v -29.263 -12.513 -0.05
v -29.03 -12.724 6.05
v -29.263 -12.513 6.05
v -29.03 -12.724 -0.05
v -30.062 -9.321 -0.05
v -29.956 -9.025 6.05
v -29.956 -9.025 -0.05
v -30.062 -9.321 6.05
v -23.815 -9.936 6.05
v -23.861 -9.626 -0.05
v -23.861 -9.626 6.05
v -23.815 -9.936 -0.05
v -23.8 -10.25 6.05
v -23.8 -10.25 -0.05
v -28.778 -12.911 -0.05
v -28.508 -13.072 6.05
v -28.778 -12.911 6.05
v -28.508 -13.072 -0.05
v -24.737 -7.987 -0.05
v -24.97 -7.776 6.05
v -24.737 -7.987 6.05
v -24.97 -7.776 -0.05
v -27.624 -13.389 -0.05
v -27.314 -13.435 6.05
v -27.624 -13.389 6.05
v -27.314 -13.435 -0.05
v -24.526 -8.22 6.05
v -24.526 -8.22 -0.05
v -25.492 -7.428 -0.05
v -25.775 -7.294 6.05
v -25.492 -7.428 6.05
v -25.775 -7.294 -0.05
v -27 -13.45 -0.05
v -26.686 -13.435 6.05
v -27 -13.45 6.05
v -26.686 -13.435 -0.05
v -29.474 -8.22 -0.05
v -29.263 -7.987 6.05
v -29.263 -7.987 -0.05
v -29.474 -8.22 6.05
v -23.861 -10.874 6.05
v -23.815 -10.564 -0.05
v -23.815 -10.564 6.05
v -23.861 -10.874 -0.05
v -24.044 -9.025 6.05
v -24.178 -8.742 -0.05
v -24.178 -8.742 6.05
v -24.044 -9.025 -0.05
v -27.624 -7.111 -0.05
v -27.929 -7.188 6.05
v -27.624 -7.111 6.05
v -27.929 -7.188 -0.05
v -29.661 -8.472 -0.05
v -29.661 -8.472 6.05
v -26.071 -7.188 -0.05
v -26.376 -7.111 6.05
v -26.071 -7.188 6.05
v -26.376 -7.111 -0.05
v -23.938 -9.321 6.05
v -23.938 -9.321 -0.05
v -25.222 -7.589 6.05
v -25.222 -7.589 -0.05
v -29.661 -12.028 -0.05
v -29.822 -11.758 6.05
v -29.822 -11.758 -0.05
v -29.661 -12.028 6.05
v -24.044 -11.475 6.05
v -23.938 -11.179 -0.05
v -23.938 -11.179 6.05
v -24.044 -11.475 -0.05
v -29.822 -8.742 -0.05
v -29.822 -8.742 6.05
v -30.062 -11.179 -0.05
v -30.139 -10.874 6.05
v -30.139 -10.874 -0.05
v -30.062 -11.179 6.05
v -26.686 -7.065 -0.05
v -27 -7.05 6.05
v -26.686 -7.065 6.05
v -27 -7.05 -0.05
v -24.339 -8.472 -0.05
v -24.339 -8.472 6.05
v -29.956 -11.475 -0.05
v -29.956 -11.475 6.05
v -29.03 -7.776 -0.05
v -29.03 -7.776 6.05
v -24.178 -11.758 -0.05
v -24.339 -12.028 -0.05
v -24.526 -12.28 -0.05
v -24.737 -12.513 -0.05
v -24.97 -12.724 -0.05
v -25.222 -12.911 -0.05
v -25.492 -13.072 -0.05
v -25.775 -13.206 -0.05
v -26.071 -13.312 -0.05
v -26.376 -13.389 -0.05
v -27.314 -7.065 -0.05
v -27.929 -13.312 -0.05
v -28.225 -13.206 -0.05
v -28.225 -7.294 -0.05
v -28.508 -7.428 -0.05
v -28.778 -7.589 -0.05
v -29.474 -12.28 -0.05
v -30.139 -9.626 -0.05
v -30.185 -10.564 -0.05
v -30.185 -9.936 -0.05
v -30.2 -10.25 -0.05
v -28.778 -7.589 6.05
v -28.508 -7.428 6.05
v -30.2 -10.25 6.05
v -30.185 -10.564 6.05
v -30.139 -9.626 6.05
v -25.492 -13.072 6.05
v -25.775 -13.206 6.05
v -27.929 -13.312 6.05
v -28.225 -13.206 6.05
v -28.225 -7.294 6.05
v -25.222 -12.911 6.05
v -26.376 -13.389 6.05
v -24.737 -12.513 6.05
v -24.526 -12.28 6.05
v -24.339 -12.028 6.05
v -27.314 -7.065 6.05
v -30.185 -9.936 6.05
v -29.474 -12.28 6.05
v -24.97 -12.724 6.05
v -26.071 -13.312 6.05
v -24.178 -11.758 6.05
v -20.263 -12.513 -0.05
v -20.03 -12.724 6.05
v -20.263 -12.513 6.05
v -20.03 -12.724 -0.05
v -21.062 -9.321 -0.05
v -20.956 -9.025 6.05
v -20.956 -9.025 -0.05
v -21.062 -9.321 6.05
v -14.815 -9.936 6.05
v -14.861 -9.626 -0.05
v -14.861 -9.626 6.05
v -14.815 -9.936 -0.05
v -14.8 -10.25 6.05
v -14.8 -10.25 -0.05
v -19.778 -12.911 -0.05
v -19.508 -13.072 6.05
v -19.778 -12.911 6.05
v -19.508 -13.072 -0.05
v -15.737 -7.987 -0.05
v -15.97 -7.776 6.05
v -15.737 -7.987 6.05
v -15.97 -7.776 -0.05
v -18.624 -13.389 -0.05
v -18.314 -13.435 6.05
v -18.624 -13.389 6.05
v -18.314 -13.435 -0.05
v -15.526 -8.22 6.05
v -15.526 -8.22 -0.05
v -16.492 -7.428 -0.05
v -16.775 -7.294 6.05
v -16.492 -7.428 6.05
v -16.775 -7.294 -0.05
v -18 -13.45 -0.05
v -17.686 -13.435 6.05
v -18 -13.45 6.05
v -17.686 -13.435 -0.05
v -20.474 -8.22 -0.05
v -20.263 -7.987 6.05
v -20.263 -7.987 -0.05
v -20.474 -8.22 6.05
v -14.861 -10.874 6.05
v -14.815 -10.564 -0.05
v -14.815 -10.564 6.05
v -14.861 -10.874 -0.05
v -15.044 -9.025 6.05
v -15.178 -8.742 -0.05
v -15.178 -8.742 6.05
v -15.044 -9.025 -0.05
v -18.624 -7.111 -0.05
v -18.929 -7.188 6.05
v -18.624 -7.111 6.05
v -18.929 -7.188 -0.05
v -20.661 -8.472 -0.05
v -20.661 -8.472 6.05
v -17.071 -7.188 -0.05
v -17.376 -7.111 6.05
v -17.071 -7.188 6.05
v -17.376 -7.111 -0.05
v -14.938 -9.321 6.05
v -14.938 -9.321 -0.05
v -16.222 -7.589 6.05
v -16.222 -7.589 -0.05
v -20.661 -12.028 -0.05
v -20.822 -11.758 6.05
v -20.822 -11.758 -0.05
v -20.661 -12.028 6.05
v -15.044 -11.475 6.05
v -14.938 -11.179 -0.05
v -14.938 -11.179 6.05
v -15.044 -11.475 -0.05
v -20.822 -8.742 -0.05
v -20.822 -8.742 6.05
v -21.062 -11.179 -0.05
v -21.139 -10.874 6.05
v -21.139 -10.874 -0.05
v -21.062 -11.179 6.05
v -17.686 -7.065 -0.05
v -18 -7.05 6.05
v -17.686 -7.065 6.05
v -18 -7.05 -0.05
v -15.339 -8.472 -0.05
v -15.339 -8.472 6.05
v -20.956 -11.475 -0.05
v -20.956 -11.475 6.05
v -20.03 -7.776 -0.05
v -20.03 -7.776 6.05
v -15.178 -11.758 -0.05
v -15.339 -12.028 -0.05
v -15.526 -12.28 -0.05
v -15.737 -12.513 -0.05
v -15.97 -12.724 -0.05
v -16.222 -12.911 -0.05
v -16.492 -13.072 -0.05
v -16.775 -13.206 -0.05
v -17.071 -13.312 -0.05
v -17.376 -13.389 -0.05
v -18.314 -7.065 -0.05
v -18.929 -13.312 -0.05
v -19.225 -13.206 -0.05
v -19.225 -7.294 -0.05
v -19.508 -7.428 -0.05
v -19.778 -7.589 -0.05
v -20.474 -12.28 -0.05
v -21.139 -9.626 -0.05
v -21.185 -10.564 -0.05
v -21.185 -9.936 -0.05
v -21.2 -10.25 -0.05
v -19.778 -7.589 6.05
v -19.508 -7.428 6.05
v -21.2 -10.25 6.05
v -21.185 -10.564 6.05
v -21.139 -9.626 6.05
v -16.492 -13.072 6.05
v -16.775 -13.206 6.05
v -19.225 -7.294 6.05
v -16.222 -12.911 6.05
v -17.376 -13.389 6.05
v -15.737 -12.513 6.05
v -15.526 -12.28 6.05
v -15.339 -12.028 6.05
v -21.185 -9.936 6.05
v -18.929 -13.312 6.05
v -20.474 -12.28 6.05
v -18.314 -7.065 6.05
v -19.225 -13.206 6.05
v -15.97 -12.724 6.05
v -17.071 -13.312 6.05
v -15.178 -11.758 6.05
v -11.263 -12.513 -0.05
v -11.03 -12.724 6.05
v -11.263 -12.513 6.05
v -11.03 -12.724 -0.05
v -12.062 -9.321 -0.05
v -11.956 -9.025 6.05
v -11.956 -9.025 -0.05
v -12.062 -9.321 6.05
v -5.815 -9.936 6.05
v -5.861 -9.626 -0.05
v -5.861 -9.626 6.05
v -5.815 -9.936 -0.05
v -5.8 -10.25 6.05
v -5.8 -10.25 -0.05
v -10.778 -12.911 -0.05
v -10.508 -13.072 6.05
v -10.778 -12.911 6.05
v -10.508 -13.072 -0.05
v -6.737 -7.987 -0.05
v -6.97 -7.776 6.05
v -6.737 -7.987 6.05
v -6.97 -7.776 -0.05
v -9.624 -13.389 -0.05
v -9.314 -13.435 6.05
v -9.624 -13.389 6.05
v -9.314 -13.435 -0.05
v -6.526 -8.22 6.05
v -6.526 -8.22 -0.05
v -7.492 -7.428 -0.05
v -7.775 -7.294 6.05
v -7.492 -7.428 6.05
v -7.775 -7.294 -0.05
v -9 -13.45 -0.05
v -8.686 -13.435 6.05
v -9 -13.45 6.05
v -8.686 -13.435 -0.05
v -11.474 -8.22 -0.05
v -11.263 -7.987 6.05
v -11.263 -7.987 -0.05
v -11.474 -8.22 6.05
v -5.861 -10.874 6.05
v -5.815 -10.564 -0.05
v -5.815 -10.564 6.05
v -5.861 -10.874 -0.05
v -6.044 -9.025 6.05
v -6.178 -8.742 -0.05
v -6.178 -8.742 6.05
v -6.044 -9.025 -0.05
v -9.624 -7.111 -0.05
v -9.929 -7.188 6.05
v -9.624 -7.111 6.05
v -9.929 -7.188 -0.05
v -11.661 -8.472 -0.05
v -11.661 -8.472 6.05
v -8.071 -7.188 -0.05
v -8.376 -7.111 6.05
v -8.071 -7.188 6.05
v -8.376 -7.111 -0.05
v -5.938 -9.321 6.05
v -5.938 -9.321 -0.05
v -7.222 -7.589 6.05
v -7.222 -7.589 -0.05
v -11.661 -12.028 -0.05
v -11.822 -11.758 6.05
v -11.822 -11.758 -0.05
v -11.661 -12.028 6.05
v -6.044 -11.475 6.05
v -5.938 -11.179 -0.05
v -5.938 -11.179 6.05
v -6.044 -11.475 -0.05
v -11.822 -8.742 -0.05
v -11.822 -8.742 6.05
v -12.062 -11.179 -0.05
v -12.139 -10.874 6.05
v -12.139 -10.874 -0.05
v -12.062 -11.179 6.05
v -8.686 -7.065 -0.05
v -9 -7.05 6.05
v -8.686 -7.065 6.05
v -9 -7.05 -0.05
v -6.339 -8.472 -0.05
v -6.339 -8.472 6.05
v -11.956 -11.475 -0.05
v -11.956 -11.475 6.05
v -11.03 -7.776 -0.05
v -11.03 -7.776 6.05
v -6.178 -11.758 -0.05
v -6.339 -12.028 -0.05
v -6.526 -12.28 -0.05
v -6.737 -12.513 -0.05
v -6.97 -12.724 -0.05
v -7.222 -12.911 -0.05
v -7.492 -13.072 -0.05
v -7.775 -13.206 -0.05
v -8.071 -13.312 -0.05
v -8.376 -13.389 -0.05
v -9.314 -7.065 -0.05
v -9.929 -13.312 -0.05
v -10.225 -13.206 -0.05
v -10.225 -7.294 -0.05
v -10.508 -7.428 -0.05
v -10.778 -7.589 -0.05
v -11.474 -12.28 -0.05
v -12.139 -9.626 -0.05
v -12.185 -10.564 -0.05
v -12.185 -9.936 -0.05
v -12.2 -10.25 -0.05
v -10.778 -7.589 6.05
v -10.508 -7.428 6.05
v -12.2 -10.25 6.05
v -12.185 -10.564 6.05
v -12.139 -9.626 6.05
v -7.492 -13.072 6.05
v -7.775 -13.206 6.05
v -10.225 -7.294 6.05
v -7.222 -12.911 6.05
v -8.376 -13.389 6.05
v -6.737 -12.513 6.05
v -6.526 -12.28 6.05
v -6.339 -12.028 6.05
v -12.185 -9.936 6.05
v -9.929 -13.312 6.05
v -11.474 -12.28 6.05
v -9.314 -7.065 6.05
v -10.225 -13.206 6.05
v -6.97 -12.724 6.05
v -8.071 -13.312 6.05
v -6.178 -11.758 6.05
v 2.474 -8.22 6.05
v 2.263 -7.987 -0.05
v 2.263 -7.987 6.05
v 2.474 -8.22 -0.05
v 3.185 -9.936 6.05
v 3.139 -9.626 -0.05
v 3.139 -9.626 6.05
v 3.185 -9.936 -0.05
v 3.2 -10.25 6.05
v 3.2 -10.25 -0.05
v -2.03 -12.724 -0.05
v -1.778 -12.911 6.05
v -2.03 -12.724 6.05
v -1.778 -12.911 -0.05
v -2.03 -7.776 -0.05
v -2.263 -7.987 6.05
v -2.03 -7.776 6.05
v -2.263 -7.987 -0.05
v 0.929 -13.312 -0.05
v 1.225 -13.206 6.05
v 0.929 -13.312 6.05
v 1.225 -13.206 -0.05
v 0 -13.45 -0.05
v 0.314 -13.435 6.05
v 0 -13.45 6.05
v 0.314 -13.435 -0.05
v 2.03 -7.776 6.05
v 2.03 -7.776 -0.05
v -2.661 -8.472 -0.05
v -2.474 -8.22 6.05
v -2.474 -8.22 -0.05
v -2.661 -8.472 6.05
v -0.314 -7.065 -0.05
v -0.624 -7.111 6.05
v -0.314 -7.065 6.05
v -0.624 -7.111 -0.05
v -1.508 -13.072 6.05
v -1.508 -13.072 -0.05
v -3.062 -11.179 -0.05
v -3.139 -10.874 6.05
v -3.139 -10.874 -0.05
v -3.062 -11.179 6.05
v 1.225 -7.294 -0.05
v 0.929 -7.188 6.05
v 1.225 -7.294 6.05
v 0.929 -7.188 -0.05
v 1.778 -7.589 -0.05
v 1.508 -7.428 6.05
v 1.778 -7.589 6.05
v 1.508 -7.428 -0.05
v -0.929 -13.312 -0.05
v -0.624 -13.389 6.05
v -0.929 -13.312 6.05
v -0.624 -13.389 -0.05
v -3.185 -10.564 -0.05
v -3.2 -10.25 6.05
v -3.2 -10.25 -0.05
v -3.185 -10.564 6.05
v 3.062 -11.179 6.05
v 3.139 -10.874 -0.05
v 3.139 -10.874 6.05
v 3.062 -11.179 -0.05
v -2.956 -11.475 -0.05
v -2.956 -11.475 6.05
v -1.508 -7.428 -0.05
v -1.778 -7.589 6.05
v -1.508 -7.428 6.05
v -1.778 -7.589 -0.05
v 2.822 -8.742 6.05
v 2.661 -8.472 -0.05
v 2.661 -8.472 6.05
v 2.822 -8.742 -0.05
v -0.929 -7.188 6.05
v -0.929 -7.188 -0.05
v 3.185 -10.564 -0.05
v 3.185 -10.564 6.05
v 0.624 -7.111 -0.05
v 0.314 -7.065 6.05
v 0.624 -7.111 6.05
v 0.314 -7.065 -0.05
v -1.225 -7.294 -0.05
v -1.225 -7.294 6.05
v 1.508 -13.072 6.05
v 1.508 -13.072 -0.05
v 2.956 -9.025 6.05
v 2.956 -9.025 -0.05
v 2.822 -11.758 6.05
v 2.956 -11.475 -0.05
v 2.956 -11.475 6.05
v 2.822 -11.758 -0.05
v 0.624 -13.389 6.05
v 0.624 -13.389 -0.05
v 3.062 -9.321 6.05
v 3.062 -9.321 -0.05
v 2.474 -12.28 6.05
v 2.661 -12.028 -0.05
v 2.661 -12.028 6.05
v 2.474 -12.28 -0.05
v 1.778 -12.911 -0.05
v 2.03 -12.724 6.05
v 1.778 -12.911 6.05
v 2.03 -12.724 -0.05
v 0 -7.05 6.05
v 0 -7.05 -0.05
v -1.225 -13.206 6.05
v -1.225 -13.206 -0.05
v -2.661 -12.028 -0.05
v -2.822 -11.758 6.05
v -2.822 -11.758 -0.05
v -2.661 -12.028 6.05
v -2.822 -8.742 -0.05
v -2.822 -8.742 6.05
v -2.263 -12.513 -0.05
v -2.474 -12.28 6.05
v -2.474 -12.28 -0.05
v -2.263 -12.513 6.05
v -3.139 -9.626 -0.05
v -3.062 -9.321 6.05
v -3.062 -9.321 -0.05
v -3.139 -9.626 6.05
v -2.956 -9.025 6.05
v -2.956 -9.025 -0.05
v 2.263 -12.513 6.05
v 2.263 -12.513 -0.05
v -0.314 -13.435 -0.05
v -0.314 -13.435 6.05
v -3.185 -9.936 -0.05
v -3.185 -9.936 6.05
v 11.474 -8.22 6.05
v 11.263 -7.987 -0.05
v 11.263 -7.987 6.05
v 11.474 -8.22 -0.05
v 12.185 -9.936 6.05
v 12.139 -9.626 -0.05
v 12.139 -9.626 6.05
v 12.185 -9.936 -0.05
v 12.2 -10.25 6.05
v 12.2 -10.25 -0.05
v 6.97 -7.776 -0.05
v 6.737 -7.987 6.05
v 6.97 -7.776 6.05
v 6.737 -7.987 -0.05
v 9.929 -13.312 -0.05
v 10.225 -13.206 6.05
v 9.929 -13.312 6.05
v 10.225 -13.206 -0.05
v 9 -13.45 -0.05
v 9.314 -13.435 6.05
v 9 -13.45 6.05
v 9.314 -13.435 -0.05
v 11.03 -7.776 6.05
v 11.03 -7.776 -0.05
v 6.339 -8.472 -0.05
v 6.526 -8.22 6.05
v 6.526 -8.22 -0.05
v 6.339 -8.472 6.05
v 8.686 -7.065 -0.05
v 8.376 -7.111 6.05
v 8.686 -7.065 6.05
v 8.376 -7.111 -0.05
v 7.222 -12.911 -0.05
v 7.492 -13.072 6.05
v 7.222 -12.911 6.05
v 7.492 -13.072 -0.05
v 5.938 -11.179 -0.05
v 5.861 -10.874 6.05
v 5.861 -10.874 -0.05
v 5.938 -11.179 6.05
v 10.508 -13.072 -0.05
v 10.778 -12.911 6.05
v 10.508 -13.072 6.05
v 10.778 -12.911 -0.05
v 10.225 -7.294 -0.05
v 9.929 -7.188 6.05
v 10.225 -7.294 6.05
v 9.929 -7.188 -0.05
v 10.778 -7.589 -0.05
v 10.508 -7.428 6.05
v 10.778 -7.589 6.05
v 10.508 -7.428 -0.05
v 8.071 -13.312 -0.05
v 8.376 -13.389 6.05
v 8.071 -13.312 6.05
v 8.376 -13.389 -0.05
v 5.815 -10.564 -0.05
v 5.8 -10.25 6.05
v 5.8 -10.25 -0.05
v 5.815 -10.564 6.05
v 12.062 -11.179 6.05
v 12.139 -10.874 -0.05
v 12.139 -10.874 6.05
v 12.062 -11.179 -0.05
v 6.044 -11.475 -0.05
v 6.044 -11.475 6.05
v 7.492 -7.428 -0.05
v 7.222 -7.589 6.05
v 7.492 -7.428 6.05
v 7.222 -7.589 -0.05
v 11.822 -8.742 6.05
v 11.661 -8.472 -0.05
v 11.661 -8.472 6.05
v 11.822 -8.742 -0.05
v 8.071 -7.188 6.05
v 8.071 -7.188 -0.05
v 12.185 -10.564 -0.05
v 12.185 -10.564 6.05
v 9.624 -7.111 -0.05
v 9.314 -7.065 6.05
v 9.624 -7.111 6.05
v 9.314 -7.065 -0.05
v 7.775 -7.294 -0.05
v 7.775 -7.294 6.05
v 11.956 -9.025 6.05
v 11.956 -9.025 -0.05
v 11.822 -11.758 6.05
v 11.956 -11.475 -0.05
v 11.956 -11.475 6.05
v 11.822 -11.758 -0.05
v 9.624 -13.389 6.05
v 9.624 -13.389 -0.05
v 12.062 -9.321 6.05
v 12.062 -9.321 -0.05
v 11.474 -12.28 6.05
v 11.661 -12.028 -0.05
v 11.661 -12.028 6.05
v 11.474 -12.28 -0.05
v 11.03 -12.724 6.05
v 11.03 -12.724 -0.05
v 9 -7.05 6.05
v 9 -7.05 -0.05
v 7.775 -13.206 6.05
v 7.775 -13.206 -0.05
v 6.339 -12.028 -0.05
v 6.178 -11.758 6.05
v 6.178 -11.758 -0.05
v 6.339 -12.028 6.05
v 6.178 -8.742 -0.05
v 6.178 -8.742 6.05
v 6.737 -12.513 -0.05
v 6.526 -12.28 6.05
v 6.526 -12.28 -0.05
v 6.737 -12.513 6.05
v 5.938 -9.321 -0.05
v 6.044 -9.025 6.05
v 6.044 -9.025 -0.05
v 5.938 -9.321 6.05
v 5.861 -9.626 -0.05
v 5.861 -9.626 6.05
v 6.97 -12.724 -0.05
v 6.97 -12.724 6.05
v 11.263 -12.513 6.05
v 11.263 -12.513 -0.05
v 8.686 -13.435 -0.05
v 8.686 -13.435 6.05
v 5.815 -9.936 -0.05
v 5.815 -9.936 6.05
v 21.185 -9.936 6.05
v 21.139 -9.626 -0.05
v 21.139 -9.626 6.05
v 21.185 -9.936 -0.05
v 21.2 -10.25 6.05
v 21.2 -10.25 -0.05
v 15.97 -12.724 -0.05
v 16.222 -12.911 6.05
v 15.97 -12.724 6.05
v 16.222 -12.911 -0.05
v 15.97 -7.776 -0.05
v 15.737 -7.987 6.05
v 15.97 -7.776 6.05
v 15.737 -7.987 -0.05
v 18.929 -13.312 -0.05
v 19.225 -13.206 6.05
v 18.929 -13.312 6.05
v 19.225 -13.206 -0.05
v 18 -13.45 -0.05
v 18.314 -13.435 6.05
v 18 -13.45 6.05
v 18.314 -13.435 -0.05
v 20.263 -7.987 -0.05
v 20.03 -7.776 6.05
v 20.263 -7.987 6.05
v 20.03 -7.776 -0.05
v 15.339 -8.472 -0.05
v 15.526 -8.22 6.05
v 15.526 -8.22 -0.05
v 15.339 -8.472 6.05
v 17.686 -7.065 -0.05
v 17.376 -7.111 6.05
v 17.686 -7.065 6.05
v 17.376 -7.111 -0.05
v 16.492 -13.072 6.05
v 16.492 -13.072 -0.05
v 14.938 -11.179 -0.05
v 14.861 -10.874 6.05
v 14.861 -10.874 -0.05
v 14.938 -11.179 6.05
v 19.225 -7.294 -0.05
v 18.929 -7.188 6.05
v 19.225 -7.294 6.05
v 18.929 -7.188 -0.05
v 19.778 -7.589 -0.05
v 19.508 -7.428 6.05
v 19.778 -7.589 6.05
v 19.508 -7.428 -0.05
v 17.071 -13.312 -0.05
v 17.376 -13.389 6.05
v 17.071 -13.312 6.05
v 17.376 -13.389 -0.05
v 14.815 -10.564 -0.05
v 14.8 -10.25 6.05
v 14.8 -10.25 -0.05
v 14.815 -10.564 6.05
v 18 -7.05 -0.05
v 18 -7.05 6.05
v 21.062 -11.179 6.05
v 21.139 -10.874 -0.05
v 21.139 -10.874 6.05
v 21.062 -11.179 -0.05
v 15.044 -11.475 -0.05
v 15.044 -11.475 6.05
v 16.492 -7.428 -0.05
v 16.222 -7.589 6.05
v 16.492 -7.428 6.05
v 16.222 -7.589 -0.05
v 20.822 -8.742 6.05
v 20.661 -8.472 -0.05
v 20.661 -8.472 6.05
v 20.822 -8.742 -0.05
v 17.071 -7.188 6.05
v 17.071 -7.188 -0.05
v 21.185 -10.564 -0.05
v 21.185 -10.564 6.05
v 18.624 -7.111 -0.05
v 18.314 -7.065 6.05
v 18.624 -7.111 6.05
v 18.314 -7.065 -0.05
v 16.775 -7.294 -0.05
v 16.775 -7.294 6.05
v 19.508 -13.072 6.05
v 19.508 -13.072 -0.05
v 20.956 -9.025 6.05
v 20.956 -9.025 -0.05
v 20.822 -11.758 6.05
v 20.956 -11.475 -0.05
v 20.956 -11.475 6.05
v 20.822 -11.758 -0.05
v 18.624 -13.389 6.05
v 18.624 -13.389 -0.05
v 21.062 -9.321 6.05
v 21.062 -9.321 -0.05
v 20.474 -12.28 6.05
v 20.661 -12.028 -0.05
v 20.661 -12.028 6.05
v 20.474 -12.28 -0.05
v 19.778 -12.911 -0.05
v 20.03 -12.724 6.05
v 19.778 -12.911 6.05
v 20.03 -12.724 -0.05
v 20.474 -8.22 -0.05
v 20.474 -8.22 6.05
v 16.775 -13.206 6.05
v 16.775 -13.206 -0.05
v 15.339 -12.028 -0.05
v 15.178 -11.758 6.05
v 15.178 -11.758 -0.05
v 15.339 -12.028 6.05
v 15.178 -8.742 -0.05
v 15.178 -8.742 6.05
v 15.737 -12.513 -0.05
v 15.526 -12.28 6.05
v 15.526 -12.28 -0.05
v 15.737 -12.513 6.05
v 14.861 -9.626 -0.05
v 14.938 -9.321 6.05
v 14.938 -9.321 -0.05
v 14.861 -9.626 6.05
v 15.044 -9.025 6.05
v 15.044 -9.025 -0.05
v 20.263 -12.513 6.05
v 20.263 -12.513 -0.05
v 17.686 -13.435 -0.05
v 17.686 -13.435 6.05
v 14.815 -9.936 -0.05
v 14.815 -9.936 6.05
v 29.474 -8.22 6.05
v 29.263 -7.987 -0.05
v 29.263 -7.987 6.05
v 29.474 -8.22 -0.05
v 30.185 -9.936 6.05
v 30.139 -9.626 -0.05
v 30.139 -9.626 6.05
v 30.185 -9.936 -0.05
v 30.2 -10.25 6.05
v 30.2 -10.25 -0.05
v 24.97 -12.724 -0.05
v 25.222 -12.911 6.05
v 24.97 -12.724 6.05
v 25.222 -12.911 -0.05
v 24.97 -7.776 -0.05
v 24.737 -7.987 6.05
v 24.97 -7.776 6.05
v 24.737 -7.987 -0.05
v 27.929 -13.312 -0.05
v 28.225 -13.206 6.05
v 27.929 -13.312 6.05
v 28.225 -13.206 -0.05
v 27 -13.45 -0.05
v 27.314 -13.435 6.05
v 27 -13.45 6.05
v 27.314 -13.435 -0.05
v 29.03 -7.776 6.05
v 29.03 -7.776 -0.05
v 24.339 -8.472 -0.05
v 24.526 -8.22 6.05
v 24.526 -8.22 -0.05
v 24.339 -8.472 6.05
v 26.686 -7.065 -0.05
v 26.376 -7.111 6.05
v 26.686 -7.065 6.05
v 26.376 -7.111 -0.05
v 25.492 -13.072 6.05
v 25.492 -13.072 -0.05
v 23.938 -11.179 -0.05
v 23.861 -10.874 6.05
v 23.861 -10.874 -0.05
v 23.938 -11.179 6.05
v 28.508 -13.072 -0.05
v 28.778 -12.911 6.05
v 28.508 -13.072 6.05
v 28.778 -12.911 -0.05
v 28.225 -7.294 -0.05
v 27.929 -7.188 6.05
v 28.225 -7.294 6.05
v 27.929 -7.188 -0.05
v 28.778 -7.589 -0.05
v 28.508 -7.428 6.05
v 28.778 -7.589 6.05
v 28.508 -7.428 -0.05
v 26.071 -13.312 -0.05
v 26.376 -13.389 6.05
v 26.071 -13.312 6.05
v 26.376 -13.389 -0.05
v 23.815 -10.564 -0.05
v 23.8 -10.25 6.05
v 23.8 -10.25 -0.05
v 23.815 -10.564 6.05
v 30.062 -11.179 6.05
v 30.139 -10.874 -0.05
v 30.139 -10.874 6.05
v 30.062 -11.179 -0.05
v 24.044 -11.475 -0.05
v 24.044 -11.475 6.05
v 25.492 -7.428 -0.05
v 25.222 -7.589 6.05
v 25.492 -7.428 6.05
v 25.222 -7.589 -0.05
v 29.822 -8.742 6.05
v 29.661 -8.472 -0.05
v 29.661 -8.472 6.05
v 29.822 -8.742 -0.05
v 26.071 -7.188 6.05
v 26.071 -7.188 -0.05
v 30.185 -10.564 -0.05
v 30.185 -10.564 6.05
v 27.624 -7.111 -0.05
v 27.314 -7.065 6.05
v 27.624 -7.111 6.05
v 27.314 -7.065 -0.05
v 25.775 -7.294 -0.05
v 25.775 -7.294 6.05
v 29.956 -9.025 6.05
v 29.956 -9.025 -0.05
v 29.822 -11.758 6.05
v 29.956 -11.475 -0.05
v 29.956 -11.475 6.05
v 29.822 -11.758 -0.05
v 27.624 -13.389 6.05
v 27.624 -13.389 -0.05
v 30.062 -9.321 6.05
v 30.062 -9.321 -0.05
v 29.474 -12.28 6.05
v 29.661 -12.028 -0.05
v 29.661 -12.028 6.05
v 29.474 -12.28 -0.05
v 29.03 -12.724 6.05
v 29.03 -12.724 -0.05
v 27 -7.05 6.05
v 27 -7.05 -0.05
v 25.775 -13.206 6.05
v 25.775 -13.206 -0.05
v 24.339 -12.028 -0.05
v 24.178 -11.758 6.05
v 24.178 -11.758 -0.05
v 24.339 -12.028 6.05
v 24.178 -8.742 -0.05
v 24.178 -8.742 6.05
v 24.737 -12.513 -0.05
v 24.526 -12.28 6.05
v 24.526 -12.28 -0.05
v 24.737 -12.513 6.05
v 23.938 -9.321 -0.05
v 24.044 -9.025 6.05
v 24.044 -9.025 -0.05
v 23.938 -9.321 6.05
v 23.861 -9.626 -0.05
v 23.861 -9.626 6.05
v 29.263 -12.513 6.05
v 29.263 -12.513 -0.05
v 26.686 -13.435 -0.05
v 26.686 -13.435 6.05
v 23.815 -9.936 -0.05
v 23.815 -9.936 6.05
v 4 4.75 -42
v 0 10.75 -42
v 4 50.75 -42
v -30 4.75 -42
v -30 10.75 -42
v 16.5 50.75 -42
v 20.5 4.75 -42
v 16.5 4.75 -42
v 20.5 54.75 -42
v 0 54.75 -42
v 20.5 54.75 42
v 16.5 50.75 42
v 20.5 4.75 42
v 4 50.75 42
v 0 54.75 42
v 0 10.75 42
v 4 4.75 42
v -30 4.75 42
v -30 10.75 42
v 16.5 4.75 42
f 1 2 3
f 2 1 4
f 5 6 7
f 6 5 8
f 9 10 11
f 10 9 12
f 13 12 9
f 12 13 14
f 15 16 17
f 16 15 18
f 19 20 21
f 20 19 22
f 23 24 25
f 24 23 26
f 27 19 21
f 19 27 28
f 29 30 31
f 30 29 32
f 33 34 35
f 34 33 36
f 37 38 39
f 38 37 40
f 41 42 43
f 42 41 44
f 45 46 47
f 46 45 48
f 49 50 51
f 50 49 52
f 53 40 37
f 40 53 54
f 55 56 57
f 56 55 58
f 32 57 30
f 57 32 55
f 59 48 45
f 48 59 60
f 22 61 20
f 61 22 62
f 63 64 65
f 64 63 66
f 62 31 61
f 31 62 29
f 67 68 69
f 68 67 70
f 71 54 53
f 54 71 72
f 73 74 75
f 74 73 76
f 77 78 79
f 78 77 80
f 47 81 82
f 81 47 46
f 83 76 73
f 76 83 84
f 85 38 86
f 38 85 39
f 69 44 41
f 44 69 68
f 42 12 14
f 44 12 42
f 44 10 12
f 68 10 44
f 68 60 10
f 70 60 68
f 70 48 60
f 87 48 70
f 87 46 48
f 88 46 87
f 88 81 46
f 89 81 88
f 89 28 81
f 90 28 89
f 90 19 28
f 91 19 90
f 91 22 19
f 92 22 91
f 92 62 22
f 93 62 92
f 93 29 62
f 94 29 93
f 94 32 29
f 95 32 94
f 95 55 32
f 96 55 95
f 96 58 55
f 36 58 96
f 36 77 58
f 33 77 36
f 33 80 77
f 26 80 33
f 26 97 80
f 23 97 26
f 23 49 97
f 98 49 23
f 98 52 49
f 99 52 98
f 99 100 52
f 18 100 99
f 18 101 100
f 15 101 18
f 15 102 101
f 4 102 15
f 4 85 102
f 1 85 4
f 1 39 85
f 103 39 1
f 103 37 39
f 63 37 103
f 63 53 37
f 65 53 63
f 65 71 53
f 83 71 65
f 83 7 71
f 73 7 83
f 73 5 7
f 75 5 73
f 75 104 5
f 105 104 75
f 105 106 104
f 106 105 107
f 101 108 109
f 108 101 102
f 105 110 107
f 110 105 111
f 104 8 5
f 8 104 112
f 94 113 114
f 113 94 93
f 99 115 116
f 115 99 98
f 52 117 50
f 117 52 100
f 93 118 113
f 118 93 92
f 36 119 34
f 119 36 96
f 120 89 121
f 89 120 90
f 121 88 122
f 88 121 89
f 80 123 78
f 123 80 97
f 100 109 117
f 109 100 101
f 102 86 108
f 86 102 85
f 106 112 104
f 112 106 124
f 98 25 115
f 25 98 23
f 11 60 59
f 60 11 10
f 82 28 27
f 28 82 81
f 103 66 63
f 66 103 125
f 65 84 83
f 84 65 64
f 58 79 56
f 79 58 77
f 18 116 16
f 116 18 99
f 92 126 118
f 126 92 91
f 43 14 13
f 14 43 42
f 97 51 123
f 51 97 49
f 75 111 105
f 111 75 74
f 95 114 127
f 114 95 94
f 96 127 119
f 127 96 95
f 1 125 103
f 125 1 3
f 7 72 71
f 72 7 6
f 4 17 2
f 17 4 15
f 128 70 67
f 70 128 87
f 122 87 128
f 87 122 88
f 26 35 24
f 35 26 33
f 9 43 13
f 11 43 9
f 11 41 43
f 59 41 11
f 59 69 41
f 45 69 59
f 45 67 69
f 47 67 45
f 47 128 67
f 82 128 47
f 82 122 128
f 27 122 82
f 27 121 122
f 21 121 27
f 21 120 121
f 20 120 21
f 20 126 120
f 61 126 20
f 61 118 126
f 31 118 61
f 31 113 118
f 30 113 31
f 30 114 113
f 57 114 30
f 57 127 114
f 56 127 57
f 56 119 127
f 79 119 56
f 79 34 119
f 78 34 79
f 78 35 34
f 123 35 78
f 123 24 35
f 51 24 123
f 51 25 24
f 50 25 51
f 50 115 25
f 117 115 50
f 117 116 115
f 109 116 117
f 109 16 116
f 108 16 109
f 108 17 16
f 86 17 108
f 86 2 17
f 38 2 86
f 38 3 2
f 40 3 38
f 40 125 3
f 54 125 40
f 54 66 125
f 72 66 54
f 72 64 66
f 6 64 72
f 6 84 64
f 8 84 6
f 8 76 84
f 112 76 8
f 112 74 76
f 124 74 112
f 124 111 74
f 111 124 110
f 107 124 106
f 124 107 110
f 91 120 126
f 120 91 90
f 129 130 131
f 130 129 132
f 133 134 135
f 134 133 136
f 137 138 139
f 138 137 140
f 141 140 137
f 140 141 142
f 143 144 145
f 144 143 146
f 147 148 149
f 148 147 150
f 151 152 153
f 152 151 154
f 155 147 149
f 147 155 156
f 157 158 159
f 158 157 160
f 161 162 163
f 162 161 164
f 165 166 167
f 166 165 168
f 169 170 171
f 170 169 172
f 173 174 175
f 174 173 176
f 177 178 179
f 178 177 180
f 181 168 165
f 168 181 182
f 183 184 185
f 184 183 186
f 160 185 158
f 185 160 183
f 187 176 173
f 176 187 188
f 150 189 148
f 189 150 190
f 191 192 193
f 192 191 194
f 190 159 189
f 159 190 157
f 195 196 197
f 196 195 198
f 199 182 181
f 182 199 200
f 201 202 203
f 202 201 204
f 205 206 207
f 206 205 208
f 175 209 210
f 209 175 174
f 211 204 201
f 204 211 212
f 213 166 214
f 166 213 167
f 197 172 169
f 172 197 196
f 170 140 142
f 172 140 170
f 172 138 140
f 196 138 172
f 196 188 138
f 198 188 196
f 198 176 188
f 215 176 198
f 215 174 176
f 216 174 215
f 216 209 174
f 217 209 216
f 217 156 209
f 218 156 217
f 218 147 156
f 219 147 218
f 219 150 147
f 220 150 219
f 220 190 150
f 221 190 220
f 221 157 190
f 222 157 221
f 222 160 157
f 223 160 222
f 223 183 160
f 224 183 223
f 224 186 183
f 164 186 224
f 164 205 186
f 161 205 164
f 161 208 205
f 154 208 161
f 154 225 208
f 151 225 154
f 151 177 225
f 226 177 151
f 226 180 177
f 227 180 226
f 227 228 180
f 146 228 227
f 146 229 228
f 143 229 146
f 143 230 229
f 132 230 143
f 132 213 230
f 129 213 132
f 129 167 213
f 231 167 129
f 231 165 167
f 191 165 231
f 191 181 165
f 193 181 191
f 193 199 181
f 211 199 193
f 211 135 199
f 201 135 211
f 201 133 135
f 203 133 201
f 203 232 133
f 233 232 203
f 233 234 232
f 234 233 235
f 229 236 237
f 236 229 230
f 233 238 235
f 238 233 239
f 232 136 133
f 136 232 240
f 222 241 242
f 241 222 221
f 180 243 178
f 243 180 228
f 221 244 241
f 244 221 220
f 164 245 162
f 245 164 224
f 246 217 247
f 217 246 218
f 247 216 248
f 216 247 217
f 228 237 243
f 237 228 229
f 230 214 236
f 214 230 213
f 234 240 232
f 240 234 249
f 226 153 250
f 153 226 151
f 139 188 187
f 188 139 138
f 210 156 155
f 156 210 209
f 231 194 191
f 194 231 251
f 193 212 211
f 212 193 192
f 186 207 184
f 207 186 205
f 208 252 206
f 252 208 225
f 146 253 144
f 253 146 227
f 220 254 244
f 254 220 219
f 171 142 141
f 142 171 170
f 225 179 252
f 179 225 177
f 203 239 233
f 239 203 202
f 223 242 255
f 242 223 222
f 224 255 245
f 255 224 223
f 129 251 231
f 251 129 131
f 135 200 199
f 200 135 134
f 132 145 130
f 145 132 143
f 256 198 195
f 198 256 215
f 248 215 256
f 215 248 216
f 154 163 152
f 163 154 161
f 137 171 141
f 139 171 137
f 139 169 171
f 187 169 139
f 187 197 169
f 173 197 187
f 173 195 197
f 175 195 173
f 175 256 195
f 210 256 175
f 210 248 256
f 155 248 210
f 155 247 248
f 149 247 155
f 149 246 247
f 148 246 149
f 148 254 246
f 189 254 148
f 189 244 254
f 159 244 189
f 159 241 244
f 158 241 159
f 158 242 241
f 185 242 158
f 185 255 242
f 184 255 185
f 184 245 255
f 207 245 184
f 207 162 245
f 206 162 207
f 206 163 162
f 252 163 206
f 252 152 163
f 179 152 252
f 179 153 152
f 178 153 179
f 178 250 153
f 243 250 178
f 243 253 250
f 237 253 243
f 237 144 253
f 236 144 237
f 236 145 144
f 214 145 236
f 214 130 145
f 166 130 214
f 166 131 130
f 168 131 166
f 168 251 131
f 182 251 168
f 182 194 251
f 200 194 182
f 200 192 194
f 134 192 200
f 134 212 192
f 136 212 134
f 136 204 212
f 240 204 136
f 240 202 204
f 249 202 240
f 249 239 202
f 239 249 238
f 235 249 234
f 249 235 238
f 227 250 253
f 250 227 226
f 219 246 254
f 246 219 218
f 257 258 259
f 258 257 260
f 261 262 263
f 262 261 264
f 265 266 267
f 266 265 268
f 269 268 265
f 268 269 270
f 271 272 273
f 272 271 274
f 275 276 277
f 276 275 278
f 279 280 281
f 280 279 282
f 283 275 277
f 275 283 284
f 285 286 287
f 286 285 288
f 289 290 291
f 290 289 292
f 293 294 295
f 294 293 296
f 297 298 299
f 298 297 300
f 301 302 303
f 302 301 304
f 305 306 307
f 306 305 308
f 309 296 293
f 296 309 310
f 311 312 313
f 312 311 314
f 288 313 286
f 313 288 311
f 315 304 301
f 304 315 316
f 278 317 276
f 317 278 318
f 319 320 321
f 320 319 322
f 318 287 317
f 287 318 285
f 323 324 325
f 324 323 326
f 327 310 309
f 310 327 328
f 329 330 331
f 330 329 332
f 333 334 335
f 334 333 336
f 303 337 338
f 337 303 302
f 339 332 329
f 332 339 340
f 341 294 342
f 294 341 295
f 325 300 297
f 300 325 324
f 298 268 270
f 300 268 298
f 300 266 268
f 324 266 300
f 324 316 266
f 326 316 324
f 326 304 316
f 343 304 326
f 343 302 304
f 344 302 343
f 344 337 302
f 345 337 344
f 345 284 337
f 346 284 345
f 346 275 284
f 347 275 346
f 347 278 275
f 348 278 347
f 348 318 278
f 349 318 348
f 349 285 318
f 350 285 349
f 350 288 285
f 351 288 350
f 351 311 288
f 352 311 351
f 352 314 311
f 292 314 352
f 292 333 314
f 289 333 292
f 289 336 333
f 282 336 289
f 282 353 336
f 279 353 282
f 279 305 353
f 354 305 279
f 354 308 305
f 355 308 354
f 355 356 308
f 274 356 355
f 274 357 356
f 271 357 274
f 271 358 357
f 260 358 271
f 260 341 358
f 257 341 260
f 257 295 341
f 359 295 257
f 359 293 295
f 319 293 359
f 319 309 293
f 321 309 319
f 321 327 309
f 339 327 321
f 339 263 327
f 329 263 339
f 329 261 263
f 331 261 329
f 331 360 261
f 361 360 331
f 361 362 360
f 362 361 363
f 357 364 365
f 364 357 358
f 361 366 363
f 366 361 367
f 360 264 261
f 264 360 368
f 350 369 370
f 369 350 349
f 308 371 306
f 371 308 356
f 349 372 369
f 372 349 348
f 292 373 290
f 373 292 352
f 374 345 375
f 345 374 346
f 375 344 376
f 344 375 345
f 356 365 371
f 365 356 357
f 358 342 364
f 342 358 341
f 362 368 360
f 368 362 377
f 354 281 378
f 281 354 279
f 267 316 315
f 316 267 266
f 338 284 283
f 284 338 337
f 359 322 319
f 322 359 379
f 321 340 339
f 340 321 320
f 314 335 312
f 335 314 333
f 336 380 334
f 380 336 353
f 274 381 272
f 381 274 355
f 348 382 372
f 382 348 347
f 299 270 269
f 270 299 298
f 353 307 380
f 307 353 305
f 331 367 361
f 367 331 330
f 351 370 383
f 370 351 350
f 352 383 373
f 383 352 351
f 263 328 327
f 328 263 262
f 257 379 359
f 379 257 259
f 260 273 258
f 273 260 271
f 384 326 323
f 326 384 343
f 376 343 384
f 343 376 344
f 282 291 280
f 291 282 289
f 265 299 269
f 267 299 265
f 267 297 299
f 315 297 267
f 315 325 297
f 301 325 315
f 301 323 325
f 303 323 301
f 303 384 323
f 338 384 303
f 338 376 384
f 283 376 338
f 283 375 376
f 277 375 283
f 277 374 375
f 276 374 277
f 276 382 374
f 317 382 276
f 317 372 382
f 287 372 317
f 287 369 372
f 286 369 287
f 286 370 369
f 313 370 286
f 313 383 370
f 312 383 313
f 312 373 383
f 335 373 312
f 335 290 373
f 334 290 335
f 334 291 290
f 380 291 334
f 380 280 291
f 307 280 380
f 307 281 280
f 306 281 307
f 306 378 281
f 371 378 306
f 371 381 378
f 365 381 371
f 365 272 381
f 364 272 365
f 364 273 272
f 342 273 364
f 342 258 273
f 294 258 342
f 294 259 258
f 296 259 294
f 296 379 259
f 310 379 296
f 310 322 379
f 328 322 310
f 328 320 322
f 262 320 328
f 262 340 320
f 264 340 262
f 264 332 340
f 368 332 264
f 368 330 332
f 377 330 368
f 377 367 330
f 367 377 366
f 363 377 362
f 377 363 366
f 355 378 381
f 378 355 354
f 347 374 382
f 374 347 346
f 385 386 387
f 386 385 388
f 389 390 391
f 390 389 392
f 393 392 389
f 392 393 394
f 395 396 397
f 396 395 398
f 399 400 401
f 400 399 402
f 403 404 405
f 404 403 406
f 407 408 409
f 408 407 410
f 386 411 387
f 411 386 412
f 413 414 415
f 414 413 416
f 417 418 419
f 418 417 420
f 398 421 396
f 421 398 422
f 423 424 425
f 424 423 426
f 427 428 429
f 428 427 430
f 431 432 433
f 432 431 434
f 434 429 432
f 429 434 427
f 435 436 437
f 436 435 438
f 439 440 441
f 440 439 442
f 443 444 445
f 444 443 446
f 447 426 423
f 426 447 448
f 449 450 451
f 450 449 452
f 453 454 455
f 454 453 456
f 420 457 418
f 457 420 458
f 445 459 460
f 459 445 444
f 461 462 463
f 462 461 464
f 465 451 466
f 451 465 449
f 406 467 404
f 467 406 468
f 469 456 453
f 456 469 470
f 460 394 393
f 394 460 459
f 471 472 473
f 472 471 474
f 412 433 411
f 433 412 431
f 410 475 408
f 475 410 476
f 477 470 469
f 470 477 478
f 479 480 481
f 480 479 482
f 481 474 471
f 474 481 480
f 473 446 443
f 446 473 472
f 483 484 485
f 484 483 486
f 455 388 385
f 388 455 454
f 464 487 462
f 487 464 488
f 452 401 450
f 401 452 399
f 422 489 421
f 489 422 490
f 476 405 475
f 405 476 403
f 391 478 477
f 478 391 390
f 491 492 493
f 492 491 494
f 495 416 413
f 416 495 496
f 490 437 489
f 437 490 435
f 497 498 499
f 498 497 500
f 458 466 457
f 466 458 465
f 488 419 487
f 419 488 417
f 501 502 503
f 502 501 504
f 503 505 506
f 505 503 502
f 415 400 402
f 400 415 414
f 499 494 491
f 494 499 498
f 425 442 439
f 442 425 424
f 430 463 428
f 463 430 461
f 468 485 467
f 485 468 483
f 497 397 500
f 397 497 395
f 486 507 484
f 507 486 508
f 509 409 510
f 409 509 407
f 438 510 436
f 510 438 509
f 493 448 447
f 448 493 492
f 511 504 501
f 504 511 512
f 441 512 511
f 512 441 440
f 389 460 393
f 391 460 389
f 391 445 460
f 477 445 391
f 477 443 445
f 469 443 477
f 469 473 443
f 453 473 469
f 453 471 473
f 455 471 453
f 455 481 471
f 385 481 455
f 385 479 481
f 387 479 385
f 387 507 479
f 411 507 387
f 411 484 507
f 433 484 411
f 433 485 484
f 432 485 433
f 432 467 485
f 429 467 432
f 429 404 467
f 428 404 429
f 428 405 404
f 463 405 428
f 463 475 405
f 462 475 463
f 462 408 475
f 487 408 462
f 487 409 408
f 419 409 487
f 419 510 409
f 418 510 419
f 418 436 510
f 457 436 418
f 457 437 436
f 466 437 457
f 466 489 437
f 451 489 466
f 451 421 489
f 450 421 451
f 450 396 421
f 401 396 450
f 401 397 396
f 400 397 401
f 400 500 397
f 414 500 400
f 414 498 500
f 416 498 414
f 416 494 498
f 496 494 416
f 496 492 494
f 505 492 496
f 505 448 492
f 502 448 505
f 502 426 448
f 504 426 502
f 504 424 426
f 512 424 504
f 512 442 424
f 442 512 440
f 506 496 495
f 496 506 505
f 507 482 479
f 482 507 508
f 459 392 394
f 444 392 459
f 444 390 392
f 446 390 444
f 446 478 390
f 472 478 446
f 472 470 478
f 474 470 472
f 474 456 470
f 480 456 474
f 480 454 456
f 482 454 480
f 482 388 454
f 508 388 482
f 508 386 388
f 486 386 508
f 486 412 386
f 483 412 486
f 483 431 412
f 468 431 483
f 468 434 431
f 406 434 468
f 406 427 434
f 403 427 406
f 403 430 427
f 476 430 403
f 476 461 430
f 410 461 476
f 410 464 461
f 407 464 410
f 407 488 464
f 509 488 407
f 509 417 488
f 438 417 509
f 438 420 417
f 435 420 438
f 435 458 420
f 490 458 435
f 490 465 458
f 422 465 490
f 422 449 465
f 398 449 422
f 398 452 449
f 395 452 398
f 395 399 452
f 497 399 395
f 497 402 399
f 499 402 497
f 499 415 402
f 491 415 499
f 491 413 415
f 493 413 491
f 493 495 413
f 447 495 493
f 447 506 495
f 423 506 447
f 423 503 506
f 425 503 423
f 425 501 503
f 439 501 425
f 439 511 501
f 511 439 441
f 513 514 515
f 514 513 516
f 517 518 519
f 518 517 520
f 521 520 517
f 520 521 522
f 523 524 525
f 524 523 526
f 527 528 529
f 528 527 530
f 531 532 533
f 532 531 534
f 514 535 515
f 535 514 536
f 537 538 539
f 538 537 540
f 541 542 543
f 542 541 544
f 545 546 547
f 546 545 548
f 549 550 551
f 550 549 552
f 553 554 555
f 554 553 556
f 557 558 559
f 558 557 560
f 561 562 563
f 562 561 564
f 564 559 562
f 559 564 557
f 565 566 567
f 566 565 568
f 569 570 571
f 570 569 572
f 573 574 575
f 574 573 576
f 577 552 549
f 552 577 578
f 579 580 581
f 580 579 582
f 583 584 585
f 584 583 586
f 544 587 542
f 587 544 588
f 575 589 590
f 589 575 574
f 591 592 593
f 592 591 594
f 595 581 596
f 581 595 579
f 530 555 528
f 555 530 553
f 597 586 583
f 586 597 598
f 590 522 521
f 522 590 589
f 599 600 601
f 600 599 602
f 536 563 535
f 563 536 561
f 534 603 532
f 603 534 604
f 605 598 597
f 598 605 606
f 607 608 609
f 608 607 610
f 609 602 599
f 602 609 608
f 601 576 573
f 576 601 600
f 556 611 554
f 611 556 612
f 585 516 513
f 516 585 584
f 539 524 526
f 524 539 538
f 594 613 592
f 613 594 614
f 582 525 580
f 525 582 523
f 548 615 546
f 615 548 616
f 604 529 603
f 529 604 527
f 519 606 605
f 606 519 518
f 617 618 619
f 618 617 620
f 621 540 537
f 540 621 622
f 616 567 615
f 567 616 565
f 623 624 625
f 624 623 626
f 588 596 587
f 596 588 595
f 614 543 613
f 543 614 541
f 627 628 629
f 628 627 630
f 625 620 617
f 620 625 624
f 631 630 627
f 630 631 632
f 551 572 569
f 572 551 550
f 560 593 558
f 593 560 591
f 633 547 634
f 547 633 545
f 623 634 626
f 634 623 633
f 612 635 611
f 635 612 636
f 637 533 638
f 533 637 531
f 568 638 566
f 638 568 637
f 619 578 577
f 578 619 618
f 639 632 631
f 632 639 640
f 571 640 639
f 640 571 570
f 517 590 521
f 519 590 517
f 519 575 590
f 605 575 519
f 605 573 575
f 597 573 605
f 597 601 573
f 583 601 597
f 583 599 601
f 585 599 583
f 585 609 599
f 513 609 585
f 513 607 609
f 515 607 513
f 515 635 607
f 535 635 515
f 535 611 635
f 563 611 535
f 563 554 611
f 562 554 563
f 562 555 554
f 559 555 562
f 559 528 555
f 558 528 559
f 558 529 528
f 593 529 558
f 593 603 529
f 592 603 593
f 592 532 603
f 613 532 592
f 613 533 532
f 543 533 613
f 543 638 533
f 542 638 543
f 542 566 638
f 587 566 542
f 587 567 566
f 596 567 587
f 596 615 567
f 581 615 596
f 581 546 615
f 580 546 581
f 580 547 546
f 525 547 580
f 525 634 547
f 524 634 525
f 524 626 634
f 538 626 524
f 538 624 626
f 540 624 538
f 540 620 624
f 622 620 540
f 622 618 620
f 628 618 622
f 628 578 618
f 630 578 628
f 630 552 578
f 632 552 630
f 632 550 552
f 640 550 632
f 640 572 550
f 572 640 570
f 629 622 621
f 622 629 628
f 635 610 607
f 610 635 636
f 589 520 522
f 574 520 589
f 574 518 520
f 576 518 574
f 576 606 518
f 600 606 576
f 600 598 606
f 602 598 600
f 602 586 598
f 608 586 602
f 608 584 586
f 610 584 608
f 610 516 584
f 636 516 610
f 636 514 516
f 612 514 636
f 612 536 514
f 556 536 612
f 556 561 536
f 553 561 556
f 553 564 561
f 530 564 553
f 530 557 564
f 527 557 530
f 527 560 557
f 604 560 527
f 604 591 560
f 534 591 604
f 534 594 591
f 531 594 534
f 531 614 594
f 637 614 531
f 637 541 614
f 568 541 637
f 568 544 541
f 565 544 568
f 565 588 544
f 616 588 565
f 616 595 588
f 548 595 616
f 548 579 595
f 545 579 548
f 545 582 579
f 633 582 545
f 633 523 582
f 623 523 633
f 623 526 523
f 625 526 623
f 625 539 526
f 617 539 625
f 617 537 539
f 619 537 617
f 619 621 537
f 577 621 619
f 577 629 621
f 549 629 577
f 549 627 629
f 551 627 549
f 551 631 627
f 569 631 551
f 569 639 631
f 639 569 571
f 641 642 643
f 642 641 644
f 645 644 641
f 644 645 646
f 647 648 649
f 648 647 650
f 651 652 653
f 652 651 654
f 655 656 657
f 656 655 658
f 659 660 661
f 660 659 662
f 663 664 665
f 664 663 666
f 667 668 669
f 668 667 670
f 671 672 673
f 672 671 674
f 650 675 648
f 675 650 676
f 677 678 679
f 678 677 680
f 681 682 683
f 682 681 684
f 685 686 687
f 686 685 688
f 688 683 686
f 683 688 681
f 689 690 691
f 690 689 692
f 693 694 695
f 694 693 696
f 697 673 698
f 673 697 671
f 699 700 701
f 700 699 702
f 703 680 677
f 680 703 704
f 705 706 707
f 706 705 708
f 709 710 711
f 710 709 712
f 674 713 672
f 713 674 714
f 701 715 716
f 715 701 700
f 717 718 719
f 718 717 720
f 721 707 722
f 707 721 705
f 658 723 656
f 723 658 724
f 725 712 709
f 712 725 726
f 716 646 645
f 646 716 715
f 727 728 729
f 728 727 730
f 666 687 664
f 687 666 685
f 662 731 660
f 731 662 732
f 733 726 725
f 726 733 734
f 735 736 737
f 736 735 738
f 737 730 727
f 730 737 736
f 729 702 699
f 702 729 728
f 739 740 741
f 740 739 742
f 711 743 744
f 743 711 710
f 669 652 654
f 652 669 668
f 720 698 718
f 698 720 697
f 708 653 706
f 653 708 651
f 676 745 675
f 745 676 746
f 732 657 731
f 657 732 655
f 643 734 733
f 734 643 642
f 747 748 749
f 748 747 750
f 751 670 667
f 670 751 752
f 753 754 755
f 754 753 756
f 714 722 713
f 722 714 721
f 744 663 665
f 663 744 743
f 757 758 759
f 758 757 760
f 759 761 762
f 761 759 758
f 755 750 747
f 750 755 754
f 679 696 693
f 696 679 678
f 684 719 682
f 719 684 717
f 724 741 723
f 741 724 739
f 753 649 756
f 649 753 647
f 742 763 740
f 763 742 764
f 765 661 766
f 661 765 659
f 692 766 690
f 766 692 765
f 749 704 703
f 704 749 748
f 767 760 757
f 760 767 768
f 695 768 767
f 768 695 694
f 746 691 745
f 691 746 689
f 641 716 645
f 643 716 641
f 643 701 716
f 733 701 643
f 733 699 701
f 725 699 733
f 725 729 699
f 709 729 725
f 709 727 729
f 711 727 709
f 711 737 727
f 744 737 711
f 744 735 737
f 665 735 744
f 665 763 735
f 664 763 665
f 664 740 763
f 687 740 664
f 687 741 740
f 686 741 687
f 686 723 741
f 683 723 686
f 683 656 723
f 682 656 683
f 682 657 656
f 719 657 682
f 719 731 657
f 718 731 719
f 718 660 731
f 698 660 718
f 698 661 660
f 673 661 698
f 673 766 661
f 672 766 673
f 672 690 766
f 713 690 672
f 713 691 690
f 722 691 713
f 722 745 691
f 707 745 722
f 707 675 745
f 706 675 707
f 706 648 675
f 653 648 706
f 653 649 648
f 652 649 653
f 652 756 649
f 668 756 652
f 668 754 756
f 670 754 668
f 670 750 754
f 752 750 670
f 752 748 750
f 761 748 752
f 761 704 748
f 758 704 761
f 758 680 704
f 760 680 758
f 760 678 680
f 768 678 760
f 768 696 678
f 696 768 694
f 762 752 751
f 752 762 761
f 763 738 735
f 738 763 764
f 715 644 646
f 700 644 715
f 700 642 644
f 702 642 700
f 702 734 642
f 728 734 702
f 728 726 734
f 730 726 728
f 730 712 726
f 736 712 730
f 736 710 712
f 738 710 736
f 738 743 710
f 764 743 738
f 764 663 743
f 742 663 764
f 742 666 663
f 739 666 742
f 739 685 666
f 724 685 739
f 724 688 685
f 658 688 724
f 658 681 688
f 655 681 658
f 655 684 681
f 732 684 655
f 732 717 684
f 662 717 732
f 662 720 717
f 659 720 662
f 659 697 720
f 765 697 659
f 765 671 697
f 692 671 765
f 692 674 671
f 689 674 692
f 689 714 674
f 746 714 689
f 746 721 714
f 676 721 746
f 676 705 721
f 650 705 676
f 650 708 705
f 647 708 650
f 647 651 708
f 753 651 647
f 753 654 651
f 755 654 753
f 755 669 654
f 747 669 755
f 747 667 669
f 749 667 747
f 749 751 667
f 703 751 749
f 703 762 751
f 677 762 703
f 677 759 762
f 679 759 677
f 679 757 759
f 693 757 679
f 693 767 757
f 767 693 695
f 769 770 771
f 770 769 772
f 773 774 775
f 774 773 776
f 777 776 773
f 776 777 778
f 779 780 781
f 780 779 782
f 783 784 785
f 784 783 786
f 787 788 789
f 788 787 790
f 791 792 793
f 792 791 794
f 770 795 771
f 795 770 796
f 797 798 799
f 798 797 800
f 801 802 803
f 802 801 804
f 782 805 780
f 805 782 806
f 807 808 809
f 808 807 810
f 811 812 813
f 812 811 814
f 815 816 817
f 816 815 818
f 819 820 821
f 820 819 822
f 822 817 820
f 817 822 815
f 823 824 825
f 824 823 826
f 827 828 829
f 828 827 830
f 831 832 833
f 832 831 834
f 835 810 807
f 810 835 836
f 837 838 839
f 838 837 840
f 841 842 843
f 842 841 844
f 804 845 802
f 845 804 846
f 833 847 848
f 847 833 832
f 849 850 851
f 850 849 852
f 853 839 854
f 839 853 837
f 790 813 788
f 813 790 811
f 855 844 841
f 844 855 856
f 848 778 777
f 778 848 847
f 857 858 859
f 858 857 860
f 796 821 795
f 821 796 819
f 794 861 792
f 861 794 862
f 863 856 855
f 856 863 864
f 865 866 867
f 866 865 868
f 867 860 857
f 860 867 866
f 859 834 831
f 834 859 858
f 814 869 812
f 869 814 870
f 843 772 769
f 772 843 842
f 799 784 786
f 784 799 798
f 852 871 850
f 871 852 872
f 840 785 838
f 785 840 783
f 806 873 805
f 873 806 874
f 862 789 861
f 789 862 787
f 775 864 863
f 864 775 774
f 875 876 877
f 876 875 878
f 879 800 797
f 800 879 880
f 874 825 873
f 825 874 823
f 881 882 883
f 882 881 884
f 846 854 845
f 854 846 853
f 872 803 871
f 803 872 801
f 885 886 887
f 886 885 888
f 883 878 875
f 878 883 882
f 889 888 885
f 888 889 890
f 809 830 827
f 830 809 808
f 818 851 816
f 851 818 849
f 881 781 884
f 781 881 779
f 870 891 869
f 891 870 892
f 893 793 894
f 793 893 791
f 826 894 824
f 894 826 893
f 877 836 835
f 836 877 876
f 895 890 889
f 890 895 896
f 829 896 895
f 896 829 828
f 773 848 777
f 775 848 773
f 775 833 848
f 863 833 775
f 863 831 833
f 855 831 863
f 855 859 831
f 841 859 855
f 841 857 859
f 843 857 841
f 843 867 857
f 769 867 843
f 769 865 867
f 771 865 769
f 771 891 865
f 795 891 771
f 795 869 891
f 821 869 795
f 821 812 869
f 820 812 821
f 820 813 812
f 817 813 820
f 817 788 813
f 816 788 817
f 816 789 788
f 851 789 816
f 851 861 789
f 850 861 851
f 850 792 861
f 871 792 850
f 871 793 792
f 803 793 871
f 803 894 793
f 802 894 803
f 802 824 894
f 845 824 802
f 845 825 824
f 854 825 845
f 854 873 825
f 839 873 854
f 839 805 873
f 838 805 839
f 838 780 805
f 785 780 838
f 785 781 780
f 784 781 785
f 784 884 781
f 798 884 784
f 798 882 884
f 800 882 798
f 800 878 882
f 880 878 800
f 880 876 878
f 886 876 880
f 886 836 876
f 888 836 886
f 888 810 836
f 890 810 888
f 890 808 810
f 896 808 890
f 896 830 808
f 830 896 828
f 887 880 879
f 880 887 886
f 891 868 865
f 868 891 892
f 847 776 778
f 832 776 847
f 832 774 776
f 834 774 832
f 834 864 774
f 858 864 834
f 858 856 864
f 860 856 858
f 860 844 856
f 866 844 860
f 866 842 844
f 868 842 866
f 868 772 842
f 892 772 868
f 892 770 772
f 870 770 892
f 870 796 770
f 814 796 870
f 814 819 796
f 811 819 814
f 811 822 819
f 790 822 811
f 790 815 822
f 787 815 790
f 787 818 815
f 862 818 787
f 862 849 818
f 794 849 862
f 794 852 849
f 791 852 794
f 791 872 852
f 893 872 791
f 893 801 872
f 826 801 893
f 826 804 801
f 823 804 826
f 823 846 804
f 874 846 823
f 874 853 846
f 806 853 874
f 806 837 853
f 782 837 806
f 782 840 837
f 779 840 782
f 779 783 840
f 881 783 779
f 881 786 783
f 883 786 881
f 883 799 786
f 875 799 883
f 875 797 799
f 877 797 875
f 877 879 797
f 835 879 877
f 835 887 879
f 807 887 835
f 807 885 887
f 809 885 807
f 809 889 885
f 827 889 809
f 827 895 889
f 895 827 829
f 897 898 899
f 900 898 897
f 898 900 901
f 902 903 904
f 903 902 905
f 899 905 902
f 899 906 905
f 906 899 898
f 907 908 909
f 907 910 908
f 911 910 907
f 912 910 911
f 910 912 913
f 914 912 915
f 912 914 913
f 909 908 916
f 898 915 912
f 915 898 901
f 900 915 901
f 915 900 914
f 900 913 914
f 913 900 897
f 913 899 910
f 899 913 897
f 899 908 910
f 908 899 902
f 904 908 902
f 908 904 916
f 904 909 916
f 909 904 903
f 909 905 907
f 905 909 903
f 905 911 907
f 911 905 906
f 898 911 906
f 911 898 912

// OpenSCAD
// Dimensions (mm)
wall_thickness = 12;
extrusion_length = 84; // along X
inner_leg_y_start = 0;
inner_leg_y_end = 4;
outer_leg_y_start = 16.5;
outer_leg_y_end = 20.5;
leg_z_start = 0;
leg_z_end = 50;
bridge_z_start = 46;
bridge_z_end = 50;
wall_gap = 12.5;
ledge_thickness = 6;
ledge_y_start = -30;
ledge_y_end = 0;
tube_hole_diameter = 6.4;
tube_spacing = 9;
tube_y_pos = -15;

$fn = 64;

// The part is defined in the YZ plane and extruded along X.
// It rests on the XY plane at z = 0 and builds upward (+Z).
// It is centred on the origin in X and Y.

// To centre the part in Y:
// The profile spans from y = -30 to y = 20.5.
// Total Y span = 50.5.
// Centre of profile = (-30 + 20.5) / 2 = -4.75.
// To centre at 0, we must translate Y by +4.75.

translate([0, 4.75, 0])
linear_extrude(height = extrusion_length, center = true)
union() {
    // Inner leg
    translate([inner_leg_y_start, leg_z_start])
        square([inner_leg_y_end - inner_leg_y_start, leg_z_end - leg_z_start]);
    
    // Outer leg
    translate([outer_leg_y_start, leg_z_start])
        square([outer_leg_y_end - outer_leg_y_start, leg_z_end - leg_z_start]);
    
    // Bridge
    translate([inner_leg_y_end, bridge_z_start])
        square([outer_leg_y_start - inner_leg_y_end, bridge_z_end - bridge_z_start]);
    
    // Ledge
    translate([ledge_y_start, leg_z_start])
        square([ledge_y_end - ledge_y_start, ledge_thickness]);
}

// Tube holes
// Holes are through the ledge (z=0 to z=6).
// Centred in X, spaced 9mm apart, at y = -15 (relative to profile).
// Since the profile is translated by +4.75 in Y, the absolute Y position of the holes is -15 + 4.75 = -10.25.
for (i = [-3, -2, -1, 0, 1, 2, 3]) {
    translate([i * tube_spacing, tube_y_pos + 4.75, ledge_thickness / 2])
        cylinder(h = ledge_thickness + 0.1, r = tube_hole_diameter / 2, center = true);
}
